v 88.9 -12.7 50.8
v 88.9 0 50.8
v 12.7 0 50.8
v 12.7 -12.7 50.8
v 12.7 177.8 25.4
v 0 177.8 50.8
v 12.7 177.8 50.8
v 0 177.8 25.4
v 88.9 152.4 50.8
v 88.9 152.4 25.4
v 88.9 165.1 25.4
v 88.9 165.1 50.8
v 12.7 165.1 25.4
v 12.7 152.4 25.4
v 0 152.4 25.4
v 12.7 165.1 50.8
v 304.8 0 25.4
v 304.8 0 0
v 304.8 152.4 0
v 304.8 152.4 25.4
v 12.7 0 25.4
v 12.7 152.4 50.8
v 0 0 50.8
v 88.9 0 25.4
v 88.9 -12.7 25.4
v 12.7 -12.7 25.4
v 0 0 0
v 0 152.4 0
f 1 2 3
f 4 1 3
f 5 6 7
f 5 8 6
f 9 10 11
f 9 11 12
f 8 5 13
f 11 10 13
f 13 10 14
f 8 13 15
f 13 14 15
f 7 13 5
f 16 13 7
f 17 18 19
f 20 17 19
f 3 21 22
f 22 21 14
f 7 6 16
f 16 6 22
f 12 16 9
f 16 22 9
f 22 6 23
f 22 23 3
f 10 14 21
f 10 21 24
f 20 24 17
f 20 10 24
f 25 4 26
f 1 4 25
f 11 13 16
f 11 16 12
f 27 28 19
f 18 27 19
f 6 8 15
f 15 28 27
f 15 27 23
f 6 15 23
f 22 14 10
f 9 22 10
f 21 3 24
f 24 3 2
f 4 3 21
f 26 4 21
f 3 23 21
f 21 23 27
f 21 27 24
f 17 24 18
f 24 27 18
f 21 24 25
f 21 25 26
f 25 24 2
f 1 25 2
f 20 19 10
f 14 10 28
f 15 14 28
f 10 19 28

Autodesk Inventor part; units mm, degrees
ref_plane "YZ Plane" through (0, 0, 0) normal (1, 0, 0) x (0, 1, 0)
ref_plane "XZ Plane" through (0, 0, 0) normal (0, 1, 0) x (-1, 0, 0)
ref_plane "XY Plane" through (0, 0, 0) normal (0, 0, 1) x (1, 0, 0)
sketch "Sketch1" plane through (0, 0, 0) normal (0, 0, 1) x (1, 0, 0)
  line L0 (0, 0) -> (304.8, 0)
  line L1 (304.8, 0) -> (304.8, 152.4)
  line L2 (304.8, 152.4) -> (0, 152.4)
  line L3 (0, 152.4) -> (0, 0)
  dimension "d0" = 304.8
  dimension "d1" = 152.4
extrude "Extrusion1" add sketch "Sketch1" along normal blind 25.4
sketch "Sketch2" plane through (0, 0, 25.4) normal (0, 0, 1) x (1, 0, 0)
  line L0 (0, 0) -> (304.8, 0) projected
  line L1 (304.8, 152.4) -> (0, 152.4) projected
  line L2 (0, 0) -> (12.7, 0)
  line L3 (12.7, 0) -> (12.7, 152.4)
  line L4 (12.7, 152.4) -> (0, 152.4)
  line L5 (0, 152.4) -> (0, 0)
  dimension "d4" = 12.7
extrude "Extrusion2" add sketch "Sketch2" along normal blind 25.4
sketch "Sketch3" plane through (0, 0, 0) normal (0, -1, 0) x (1, 0, 0)
  line L0 (304.8, 25.4) -> (12.7, 25.4) projected
  line L1 (12.7, 25.4) -> (88.9, 25.4)
  line L2 (88.9, 25.4) -> (88.9, 50.8)
  line L3 (88.9, 50.8) -> (12.7, 50.8)
  line L4 (12.7, 50.8) -> (12.7, 25.4)
  point P0 (0, 0)
  dimension "d7" = 76.2
sketch "Sketch4" plane through (0, 152.4, 0) normal (0, 1, 0) x (1, 0, 0)
  line L0 (304.8, -25.4) -> (12.7, -25.4) projected
  line L1 (12.7, -25.4) -> (88.9, -25.4)
  line L2 (88.9, -25.4) -> (88.9, -50.8)
  line L3 (88.9, -50.8) -> (12.7, -50.8)
  line L4 (12.7, -50.8) -> (12.7, -25.4)
  point P0 (0, 0)
  dimension "d8" = 76.2
extrude "Extrusion3" add sketch "Sketch4" along normal blind 12.7
extrude "Extrusion4" add sketch "Sketch3" along normal blind 12.7
sketch "Sketch5" plane through (12.7, 152.4, 25.4) normal (-1, 0, 0) x (0, 0, 1)
  point P0 (-25.4, -152.4)
sketch "Sketch6" plane through (0, 152.4, 0) normal (0, 1, 0) x (1, 0, 0)
  line L0 (12.7, -25.4) -> (12.7, -50.8) projected
  line L1 (0, 0) -> (0, -50.8) projected
  line L2 (12.7, -25.4) -> (0, -25.4)
  line L3 (0, -25.4) -> (0, -50.8)
  line L4 (0, -50.8) -> (12.7, -50.8)
  line L5 (12.7, -50.8) -> (12.7, -25.4)
extrude "Extrusion5" add sketch "Sketch6" along normal blind 25.4
properties part number "BackLiftProtoPart4"
